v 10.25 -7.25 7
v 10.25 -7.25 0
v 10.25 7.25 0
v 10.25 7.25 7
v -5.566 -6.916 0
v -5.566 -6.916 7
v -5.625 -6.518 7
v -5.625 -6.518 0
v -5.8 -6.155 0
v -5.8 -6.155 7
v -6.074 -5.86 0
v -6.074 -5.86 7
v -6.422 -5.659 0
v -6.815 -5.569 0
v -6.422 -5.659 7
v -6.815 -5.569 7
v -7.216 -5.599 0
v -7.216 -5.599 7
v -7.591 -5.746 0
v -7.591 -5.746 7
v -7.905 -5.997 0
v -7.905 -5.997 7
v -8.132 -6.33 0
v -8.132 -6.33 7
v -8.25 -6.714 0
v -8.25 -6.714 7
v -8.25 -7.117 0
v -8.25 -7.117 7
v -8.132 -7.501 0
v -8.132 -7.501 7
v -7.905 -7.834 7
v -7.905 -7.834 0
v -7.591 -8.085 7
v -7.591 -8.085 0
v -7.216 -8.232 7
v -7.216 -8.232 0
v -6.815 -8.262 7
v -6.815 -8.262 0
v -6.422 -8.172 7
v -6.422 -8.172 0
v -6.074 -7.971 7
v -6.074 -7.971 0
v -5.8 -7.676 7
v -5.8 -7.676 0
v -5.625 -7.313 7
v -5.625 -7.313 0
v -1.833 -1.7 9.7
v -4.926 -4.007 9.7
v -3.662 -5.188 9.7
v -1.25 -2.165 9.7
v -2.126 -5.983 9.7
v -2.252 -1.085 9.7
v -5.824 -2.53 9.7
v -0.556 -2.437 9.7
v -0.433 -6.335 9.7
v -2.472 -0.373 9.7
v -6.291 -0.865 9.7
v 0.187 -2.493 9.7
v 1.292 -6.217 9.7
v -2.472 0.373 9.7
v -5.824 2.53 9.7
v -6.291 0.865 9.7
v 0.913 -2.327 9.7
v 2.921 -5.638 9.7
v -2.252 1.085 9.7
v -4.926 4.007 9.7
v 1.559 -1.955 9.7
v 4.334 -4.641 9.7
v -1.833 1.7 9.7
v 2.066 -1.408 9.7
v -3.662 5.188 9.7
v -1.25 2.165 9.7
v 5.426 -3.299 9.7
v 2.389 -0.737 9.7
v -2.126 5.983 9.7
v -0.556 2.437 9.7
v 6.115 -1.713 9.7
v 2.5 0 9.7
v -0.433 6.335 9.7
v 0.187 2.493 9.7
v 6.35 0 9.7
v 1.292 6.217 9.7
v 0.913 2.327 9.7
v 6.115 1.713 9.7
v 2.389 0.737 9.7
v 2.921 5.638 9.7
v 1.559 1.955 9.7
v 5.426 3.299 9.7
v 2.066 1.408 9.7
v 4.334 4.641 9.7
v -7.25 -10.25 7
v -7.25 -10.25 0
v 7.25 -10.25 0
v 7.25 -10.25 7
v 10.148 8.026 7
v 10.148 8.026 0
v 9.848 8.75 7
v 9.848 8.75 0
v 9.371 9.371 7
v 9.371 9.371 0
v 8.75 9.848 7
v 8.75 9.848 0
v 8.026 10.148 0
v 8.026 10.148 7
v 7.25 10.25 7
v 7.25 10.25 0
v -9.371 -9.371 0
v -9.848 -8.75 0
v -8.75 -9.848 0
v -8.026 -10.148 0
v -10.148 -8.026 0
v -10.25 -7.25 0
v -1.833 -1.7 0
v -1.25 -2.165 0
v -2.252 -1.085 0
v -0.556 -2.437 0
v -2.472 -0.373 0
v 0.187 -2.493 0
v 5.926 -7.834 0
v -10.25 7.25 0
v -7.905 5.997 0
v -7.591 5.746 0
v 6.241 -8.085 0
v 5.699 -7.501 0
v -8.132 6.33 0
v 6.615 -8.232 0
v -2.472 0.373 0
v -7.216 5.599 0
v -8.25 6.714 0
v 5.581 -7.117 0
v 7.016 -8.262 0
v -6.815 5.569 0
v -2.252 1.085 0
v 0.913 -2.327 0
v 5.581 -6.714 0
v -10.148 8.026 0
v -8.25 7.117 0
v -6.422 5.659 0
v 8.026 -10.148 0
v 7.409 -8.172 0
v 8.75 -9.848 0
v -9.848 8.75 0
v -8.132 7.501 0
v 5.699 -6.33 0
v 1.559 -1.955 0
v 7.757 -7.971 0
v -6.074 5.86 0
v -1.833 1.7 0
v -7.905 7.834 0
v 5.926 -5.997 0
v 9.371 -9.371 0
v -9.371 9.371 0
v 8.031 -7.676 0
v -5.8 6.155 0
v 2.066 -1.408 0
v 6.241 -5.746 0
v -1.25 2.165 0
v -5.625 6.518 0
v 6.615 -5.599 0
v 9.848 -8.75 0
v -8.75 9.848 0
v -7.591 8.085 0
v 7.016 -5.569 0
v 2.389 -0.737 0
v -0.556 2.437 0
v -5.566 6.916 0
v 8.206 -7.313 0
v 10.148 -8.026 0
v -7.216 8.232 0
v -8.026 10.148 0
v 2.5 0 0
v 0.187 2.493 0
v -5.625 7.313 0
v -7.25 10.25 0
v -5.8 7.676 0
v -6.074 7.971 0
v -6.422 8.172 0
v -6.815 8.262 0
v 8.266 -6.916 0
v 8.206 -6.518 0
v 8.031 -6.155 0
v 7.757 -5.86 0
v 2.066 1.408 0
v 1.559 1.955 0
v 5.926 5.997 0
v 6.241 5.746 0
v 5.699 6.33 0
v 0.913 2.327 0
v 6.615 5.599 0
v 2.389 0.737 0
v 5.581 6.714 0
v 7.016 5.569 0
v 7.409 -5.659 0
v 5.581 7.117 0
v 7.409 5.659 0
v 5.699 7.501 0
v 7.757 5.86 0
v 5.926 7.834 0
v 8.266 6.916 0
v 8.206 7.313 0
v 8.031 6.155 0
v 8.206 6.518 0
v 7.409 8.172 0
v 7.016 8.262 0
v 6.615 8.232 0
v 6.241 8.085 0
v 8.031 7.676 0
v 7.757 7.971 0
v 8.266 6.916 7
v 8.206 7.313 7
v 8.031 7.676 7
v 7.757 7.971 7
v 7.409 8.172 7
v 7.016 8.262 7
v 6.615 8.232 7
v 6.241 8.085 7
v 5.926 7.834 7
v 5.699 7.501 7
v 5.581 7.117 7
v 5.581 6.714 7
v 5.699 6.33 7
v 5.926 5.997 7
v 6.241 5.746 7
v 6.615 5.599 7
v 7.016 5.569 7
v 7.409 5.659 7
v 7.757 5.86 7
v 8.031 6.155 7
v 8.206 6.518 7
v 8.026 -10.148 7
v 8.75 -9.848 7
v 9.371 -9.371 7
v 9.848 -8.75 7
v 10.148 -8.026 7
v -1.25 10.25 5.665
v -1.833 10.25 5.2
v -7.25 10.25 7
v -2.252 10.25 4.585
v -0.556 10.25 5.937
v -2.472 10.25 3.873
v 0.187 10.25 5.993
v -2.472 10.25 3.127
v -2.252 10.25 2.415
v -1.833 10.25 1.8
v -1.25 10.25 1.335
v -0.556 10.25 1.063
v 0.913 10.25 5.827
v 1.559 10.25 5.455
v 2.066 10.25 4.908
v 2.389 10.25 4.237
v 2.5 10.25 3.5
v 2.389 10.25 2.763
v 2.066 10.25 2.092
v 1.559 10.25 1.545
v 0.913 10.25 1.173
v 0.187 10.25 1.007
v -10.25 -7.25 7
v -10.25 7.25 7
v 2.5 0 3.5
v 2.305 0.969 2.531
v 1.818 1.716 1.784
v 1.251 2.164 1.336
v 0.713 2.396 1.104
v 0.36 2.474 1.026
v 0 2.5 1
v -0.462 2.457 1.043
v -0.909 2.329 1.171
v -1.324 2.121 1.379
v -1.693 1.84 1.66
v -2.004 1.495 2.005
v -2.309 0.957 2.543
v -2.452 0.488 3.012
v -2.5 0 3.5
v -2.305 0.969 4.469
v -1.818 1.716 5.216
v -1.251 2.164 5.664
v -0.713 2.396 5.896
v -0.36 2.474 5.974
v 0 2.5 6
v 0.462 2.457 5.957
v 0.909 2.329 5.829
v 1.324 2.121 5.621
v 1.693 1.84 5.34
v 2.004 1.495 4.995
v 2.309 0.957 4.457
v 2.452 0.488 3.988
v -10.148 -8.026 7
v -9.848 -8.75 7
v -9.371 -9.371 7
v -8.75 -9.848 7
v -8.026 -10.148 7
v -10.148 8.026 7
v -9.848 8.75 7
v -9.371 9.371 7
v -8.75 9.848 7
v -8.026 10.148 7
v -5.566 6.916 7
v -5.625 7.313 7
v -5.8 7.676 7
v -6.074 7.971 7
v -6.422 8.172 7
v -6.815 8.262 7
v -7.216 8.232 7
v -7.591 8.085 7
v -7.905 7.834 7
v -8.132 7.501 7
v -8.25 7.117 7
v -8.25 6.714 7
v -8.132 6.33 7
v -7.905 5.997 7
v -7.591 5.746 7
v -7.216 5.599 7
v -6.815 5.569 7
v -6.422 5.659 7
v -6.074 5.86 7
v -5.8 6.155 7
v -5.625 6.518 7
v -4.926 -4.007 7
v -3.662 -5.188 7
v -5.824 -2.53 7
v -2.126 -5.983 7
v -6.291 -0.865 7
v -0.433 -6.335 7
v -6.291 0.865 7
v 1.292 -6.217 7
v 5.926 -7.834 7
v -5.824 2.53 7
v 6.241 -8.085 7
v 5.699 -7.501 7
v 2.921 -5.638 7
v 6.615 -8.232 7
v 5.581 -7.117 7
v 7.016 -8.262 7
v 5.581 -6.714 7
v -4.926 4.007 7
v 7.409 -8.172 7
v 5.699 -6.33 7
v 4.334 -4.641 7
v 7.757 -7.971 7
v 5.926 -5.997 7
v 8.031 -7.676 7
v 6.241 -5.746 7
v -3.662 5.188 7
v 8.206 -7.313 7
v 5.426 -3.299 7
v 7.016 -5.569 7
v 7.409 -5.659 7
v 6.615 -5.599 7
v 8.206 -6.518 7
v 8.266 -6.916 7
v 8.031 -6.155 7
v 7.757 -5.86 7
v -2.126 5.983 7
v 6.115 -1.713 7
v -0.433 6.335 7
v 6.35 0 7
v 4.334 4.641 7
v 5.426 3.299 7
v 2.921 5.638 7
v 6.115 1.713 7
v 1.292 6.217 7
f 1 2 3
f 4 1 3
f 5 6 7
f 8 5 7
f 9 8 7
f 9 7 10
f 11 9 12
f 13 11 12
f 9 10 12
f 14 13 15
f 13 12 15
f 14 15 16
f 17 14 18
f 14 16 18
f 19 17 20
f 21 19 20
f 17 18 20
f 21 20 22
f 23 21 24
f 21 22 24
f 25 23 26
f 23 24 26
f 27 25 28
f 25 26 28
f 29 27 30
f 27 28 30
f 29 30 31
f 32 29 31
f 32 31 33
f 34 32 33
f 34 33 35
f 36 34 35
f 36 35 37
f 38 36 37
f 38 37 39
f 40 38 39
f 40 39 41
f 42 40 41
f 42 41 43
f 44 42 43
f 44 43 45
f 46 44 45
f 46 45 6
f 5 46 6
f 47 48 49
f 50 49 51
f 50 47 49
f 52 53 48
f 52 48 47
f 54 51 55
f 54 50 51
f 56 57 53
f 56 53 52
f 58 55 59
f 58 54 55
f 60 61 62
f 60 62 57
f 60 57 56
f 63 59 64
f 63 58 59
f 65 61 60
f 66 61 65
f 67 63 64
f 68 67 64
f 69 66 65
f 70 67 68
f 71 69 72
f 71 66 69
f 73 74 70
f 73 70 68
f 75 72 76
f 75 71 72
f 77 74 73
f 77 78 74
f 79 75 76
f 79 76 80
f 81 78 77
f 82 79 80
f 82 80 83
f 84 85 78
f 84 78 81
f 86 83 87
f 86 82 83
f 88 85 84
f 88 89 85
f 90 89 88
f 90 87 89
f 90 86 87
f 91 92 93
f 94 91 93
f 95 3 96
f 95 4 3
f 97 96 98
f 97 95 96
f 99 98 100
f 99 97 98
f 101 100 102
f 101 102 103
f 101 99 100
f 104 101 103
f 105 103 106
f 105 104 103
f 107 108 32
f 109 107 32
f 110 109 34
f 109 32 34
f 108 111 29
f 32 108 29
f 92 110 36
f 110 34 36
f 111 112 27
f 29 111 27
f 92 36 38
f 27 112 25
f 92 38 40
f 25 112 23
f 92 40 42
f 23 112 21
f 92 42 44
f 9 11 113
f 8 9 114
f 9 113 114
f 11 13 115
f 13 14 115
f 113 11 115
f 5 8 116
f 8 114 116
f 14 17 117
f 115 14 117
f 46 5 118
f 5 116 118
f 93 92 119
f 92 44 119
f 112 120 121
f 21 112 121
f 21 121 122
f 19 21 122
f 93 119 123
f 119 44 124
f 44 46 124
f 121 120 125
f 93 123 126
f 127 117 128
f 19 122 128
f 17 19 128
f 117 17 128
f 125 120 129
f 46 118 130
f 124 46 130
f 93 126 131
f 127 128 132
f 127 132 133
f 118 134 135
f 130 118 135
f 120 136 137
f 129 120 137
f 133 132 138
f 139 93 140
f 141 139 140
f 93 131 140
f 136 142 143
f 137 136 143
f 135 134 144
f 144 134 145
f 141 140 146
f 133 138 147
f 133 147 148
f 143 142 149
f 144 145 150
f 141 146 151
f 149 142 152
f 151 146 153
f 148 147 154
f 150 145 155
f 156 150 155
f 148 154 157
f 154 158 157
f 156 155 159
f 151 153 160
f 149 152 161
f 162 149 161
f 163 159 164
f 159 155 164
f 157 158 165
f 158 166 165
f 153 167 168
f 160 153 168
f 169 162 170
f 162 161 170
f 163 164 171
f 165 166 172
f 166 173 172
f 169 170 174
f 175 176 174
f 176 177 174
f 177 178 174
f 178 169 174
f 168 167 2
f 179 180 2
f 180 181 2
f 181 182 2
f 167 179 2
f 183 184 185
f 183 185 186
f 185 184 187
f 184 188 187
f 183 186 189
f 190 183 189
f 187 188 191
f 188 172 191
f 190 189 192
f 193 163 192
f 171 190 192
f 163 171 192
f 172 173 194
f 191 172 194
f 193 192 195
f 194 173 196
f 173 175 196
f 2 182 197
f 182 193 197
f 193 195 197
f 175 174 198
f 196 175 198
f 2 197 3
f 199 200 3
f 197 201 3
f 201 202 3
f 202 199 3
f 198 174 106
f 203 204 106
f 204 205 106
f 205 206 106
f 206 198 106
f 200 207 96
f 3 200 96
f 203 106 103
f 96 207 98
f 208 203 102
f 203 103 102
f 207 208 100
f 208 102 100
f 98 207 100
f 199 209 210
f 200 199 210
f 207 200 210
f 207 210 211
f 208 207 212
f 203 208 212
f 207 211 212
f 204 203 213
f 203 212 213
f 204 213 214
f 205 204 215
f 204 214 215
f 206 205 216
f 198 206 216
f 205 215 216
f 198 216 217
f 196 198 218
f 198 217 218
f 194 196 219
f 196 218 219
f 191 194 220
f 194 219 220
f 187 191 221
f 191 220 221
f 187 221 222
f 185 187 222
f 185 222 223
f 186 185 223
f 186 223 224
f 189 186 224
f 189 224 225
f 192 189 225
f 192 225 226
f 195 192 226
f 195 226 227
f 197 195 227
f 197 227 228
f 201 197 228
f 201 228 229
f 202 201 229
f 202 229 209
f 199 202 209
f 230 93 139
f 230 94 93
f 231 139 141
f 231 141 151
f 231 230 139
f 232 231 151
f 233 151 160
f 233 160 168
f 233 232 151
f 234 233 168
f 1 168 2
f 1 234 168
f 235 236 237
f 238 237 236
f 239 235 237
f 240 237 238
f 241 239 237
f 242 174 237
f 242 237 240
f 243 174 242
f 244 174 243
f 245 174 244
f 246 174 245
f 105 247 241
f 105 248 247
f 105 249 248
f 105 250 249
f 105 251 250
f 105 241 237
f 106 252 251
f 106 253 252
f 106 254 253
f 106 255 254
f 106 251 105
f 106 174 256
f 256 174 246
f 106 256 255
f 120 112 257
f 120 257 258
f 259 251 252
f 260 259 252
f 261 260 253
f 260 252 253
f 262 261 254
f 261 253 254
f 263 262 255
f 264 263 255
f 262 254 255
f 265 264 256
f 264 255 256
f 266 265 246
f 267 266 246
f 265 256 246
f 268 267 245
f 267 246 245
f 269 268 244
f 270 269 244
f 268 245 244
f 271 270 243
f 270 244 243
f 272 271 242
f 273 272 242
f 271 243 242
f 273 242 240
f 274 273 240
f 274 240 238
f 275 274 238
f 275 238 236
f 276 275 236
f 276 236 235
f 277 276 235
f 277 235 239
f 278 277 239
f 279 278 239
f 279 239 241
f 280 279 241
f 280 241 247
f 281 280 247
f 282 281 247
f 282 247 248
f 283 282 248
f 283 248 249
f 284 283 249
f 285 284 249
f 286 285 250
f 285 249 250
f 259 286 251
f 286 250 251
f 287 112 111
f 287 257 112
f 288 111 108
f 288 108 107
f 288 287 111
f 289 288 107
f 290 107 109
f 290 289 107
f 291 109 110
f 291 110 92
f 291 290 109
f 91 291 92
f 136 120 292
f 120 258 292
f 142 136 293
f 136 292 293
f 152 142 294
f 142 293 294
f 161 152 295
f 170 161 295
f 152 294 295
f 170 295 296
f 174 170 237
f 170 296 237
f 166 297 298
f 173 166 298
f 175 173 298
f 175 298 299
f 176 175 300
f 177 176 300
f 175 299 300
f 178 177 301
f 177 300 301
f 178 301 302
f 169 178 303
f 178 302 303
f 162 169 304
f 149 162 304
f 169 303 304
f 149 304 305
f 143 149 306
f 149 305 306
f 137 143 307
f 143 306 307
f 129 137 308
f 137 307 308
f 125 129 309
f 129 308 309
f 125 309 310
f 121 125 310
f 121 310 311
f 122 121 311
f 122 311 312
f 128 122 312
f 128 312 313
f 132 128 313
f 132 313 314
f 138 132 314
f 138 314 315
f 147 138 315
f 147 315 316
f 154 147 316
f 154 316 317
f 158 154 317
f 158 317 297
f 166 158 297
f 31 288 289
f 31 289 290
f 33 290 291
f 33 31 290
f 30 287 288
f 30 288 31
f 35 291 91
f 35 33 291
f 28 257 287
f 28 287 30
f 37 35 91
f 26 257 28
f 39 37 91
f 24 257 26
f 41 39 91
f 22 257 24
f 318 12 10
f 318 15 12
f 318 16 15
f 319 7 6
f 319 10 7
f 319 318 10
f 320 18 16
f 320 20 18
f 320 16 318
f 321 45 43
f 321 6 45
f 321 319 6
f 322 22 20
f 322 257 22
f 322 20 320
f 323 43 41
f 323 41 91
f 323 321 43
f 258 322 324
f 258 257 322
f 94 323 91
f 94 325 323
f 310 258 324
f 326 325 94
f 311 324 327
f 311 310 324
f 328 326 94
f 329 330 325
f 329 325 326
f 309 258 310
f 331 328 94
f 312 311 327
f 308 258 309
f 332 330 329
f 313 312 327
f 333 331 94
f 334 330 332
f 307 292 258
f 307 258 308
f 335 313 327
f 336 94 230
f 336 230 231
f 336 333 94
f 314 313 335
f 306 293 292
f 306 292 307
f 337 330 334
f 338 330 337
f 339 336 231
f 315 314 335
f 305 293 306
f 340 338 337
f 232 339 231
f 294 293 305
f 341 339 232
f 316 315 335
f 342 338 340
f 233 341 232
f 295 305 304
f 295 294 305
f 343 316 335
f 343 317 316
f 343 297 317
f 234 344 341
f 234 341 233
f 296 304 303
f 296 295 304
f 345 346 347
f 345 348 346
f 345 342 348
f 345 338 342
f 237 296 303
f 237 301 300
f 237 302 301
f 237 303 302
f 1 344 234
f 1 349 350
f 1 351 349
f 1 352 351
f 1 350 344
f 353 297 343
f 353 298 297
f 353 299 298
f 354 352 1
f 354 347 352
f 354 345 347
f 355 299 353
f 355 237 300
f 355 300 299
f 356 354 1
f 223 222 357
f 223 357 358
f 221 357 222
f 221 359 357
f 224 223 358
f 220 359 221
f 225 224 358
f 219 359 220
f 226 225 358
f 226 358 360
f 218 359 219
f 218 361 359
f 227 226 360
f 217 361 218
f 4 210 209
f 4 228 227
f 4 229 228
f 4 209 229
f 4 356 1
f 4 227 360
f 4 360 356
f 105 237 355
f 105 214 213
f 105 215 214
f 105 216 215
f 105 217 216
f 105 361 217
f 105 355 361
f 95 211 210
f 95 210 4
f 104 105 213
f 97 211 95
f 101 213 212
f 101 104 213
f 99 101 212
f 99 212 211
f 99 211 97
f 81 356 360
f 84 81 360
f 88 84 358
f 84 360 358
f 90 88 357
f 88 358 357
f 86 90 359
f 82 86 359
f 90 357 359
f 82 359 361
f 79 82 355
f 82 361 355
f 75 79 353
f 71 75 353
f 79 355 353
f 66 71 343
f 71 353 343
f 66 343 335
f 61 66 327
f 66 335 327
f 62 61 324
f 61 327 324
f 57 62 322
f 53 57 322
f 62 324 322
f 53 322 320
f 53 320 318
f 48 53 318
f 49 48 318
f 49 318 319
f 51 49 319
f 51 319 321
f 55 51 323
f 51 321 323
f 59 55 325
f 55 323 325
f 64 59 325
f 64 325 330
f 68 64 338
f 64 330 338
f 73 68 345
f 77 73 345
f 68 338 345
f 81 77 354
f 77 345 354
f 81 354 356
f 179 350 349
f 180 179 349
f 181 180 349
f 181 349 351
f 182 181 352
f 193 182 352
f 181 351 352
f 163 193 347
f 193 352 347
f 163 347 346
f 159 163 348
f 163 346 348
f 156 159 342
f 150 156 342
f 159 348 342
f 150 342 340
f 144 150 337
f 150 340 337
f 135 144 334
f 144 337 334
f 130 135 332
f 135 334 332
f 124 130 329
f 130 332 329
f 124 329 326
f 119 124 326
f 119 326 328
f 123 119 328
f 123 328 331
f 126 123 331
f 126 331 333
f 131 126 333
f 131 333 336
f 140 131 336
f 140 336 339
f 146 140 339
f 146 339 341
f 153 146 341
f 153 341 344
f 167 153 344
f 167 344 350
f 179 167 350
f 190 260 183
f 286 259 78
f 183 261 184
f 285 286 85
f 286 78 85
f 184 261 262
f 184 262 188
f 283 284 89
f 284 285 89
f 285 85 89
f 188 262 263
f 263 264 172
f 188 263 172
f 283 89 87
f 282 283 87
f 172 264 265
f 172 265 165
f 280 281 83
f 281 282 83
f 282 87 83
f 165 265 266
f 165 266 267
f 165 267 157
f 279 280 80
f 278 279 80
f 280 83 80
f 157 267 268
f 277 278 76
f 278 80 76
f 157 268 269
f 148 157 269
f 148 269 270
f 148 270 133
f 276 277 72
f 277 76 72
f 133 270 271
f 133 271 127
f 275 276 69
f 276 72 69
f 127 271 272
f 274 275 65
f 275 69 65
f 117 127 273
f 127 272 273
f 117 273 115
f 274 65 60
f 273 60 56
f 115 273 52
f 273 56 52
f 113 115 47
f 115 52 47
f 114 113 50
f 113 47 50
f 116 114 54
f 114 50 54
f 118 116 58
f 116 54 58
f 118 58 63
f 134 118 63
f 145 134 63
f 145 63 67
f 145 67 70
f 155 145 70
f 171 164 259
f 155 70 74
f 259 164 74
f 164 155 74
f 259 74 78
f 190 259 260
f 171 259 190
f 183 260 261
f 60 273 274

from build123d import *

# Parameters (mm, degrees)
CROQUIS1_W              = 20.5
CROQUIS1_H              = 20.5
SALIENTE_EXTRUIR1_DEPTH = 7
REDONDEO1_R             = 3
CROQUIS2_R              = 6.35
SALIENTE_EXTRUIR2_DEPTH = 2.7
CROQUIS3_R              = 2.5
CORTAR_EXTRUIR1_DEPTH   = 10.7
CROQUIS4_R              = 1.35
CORTAR_EXTRUIR2_DEPTH   = 8
CORTAR_EXTRUIR3_REACH   = 22.5
CROQUIS5_R              = 2.5


with BuildPart() as part:
    # Croquis1 → Saliente-Extruir1 (new body)
    with BuildSketch(Plane.XY):
        Rectangle(CROQUIS1_W, CROQUIS1_H)
    extrude(amount=SALIENTE_EXTRUIR1_DEPTH)

    # Redondeo1
    redondeo1_edges = [part.edges().sort_by_distance(p)[0] for p in [
        (10.25, -10.25, 3.5),
        (-10.25, -10.25, 3.5),
        (-10.25, 10.25, 3.5),
        (10.25, 10.25, 3.5),
    ]]
    fillet(redondeo1_edges, radius=REDONDEO1_R)

    # Croquis2 → Saliente-Extruir2 (add)
    with BuildSketch(Plane.XY.offset(7)):
        Circle(CROQUIS2_R)
    extrude(amount=SALIENTE_EXTRUIR2_DEPTH)

    # Croquis3 → Cortar-Extruir1 (cut, through all)
    with BuildSketch(Plane.XY.offset(9.7)):
        Circle(CROQUIS3_R)
    extrude(amount=-CORTAR_EXTRUIR1_DEPTH, mode=Mode.SUBTRACT)

    # Croquis4 → Cortar-Extruir2 (cut, through all)
    with BuildSketch(Plane.XY.offset(7)):
        with Locations((-6.91550432, 6.91550432)):
            Circle(CROQUIS4_R)
        with Locations((6.91550432, 6.91550432)):
            Circle(CROQUIS4_R)
        with Locations((6.91550432, -6.91550432)):
            Circle(CROQUIS4_R)
        with Locations((-6.91550432, -6.91550432)):
            Circle(CROQUIS4_R)
    extrude(amount=-CORTAR_EXTRUIR2_DEPTH, mode=Mode.SUBTRACT)

    # Croquis5 → Cortar-Extruir3 (cut, up to next)
    with BuildSketch(Plane(origin=(0, 10.25, 0), x_dir=(1, 0, 0), z_dir=(0, 1, 0)), mode=Mode.PRIVATE) as cortar_extruir3_sk1:
        with Locations((0, -3.5)):
            Circle(CROQUIS5_R)
    cortar_extruir3_tool1 = extrude(cortar_extruir3_sk1.sketch, amount=-CORTAR_EXTRUIR3_REACH, mode=Mode.PRIVATE) & part.part
    add(cortar_extruir3_tool1.solids().sort_by_distance((0, 10.25, 3.5))[0], mode=Mode.SUBTRACT)


solid = part.part
